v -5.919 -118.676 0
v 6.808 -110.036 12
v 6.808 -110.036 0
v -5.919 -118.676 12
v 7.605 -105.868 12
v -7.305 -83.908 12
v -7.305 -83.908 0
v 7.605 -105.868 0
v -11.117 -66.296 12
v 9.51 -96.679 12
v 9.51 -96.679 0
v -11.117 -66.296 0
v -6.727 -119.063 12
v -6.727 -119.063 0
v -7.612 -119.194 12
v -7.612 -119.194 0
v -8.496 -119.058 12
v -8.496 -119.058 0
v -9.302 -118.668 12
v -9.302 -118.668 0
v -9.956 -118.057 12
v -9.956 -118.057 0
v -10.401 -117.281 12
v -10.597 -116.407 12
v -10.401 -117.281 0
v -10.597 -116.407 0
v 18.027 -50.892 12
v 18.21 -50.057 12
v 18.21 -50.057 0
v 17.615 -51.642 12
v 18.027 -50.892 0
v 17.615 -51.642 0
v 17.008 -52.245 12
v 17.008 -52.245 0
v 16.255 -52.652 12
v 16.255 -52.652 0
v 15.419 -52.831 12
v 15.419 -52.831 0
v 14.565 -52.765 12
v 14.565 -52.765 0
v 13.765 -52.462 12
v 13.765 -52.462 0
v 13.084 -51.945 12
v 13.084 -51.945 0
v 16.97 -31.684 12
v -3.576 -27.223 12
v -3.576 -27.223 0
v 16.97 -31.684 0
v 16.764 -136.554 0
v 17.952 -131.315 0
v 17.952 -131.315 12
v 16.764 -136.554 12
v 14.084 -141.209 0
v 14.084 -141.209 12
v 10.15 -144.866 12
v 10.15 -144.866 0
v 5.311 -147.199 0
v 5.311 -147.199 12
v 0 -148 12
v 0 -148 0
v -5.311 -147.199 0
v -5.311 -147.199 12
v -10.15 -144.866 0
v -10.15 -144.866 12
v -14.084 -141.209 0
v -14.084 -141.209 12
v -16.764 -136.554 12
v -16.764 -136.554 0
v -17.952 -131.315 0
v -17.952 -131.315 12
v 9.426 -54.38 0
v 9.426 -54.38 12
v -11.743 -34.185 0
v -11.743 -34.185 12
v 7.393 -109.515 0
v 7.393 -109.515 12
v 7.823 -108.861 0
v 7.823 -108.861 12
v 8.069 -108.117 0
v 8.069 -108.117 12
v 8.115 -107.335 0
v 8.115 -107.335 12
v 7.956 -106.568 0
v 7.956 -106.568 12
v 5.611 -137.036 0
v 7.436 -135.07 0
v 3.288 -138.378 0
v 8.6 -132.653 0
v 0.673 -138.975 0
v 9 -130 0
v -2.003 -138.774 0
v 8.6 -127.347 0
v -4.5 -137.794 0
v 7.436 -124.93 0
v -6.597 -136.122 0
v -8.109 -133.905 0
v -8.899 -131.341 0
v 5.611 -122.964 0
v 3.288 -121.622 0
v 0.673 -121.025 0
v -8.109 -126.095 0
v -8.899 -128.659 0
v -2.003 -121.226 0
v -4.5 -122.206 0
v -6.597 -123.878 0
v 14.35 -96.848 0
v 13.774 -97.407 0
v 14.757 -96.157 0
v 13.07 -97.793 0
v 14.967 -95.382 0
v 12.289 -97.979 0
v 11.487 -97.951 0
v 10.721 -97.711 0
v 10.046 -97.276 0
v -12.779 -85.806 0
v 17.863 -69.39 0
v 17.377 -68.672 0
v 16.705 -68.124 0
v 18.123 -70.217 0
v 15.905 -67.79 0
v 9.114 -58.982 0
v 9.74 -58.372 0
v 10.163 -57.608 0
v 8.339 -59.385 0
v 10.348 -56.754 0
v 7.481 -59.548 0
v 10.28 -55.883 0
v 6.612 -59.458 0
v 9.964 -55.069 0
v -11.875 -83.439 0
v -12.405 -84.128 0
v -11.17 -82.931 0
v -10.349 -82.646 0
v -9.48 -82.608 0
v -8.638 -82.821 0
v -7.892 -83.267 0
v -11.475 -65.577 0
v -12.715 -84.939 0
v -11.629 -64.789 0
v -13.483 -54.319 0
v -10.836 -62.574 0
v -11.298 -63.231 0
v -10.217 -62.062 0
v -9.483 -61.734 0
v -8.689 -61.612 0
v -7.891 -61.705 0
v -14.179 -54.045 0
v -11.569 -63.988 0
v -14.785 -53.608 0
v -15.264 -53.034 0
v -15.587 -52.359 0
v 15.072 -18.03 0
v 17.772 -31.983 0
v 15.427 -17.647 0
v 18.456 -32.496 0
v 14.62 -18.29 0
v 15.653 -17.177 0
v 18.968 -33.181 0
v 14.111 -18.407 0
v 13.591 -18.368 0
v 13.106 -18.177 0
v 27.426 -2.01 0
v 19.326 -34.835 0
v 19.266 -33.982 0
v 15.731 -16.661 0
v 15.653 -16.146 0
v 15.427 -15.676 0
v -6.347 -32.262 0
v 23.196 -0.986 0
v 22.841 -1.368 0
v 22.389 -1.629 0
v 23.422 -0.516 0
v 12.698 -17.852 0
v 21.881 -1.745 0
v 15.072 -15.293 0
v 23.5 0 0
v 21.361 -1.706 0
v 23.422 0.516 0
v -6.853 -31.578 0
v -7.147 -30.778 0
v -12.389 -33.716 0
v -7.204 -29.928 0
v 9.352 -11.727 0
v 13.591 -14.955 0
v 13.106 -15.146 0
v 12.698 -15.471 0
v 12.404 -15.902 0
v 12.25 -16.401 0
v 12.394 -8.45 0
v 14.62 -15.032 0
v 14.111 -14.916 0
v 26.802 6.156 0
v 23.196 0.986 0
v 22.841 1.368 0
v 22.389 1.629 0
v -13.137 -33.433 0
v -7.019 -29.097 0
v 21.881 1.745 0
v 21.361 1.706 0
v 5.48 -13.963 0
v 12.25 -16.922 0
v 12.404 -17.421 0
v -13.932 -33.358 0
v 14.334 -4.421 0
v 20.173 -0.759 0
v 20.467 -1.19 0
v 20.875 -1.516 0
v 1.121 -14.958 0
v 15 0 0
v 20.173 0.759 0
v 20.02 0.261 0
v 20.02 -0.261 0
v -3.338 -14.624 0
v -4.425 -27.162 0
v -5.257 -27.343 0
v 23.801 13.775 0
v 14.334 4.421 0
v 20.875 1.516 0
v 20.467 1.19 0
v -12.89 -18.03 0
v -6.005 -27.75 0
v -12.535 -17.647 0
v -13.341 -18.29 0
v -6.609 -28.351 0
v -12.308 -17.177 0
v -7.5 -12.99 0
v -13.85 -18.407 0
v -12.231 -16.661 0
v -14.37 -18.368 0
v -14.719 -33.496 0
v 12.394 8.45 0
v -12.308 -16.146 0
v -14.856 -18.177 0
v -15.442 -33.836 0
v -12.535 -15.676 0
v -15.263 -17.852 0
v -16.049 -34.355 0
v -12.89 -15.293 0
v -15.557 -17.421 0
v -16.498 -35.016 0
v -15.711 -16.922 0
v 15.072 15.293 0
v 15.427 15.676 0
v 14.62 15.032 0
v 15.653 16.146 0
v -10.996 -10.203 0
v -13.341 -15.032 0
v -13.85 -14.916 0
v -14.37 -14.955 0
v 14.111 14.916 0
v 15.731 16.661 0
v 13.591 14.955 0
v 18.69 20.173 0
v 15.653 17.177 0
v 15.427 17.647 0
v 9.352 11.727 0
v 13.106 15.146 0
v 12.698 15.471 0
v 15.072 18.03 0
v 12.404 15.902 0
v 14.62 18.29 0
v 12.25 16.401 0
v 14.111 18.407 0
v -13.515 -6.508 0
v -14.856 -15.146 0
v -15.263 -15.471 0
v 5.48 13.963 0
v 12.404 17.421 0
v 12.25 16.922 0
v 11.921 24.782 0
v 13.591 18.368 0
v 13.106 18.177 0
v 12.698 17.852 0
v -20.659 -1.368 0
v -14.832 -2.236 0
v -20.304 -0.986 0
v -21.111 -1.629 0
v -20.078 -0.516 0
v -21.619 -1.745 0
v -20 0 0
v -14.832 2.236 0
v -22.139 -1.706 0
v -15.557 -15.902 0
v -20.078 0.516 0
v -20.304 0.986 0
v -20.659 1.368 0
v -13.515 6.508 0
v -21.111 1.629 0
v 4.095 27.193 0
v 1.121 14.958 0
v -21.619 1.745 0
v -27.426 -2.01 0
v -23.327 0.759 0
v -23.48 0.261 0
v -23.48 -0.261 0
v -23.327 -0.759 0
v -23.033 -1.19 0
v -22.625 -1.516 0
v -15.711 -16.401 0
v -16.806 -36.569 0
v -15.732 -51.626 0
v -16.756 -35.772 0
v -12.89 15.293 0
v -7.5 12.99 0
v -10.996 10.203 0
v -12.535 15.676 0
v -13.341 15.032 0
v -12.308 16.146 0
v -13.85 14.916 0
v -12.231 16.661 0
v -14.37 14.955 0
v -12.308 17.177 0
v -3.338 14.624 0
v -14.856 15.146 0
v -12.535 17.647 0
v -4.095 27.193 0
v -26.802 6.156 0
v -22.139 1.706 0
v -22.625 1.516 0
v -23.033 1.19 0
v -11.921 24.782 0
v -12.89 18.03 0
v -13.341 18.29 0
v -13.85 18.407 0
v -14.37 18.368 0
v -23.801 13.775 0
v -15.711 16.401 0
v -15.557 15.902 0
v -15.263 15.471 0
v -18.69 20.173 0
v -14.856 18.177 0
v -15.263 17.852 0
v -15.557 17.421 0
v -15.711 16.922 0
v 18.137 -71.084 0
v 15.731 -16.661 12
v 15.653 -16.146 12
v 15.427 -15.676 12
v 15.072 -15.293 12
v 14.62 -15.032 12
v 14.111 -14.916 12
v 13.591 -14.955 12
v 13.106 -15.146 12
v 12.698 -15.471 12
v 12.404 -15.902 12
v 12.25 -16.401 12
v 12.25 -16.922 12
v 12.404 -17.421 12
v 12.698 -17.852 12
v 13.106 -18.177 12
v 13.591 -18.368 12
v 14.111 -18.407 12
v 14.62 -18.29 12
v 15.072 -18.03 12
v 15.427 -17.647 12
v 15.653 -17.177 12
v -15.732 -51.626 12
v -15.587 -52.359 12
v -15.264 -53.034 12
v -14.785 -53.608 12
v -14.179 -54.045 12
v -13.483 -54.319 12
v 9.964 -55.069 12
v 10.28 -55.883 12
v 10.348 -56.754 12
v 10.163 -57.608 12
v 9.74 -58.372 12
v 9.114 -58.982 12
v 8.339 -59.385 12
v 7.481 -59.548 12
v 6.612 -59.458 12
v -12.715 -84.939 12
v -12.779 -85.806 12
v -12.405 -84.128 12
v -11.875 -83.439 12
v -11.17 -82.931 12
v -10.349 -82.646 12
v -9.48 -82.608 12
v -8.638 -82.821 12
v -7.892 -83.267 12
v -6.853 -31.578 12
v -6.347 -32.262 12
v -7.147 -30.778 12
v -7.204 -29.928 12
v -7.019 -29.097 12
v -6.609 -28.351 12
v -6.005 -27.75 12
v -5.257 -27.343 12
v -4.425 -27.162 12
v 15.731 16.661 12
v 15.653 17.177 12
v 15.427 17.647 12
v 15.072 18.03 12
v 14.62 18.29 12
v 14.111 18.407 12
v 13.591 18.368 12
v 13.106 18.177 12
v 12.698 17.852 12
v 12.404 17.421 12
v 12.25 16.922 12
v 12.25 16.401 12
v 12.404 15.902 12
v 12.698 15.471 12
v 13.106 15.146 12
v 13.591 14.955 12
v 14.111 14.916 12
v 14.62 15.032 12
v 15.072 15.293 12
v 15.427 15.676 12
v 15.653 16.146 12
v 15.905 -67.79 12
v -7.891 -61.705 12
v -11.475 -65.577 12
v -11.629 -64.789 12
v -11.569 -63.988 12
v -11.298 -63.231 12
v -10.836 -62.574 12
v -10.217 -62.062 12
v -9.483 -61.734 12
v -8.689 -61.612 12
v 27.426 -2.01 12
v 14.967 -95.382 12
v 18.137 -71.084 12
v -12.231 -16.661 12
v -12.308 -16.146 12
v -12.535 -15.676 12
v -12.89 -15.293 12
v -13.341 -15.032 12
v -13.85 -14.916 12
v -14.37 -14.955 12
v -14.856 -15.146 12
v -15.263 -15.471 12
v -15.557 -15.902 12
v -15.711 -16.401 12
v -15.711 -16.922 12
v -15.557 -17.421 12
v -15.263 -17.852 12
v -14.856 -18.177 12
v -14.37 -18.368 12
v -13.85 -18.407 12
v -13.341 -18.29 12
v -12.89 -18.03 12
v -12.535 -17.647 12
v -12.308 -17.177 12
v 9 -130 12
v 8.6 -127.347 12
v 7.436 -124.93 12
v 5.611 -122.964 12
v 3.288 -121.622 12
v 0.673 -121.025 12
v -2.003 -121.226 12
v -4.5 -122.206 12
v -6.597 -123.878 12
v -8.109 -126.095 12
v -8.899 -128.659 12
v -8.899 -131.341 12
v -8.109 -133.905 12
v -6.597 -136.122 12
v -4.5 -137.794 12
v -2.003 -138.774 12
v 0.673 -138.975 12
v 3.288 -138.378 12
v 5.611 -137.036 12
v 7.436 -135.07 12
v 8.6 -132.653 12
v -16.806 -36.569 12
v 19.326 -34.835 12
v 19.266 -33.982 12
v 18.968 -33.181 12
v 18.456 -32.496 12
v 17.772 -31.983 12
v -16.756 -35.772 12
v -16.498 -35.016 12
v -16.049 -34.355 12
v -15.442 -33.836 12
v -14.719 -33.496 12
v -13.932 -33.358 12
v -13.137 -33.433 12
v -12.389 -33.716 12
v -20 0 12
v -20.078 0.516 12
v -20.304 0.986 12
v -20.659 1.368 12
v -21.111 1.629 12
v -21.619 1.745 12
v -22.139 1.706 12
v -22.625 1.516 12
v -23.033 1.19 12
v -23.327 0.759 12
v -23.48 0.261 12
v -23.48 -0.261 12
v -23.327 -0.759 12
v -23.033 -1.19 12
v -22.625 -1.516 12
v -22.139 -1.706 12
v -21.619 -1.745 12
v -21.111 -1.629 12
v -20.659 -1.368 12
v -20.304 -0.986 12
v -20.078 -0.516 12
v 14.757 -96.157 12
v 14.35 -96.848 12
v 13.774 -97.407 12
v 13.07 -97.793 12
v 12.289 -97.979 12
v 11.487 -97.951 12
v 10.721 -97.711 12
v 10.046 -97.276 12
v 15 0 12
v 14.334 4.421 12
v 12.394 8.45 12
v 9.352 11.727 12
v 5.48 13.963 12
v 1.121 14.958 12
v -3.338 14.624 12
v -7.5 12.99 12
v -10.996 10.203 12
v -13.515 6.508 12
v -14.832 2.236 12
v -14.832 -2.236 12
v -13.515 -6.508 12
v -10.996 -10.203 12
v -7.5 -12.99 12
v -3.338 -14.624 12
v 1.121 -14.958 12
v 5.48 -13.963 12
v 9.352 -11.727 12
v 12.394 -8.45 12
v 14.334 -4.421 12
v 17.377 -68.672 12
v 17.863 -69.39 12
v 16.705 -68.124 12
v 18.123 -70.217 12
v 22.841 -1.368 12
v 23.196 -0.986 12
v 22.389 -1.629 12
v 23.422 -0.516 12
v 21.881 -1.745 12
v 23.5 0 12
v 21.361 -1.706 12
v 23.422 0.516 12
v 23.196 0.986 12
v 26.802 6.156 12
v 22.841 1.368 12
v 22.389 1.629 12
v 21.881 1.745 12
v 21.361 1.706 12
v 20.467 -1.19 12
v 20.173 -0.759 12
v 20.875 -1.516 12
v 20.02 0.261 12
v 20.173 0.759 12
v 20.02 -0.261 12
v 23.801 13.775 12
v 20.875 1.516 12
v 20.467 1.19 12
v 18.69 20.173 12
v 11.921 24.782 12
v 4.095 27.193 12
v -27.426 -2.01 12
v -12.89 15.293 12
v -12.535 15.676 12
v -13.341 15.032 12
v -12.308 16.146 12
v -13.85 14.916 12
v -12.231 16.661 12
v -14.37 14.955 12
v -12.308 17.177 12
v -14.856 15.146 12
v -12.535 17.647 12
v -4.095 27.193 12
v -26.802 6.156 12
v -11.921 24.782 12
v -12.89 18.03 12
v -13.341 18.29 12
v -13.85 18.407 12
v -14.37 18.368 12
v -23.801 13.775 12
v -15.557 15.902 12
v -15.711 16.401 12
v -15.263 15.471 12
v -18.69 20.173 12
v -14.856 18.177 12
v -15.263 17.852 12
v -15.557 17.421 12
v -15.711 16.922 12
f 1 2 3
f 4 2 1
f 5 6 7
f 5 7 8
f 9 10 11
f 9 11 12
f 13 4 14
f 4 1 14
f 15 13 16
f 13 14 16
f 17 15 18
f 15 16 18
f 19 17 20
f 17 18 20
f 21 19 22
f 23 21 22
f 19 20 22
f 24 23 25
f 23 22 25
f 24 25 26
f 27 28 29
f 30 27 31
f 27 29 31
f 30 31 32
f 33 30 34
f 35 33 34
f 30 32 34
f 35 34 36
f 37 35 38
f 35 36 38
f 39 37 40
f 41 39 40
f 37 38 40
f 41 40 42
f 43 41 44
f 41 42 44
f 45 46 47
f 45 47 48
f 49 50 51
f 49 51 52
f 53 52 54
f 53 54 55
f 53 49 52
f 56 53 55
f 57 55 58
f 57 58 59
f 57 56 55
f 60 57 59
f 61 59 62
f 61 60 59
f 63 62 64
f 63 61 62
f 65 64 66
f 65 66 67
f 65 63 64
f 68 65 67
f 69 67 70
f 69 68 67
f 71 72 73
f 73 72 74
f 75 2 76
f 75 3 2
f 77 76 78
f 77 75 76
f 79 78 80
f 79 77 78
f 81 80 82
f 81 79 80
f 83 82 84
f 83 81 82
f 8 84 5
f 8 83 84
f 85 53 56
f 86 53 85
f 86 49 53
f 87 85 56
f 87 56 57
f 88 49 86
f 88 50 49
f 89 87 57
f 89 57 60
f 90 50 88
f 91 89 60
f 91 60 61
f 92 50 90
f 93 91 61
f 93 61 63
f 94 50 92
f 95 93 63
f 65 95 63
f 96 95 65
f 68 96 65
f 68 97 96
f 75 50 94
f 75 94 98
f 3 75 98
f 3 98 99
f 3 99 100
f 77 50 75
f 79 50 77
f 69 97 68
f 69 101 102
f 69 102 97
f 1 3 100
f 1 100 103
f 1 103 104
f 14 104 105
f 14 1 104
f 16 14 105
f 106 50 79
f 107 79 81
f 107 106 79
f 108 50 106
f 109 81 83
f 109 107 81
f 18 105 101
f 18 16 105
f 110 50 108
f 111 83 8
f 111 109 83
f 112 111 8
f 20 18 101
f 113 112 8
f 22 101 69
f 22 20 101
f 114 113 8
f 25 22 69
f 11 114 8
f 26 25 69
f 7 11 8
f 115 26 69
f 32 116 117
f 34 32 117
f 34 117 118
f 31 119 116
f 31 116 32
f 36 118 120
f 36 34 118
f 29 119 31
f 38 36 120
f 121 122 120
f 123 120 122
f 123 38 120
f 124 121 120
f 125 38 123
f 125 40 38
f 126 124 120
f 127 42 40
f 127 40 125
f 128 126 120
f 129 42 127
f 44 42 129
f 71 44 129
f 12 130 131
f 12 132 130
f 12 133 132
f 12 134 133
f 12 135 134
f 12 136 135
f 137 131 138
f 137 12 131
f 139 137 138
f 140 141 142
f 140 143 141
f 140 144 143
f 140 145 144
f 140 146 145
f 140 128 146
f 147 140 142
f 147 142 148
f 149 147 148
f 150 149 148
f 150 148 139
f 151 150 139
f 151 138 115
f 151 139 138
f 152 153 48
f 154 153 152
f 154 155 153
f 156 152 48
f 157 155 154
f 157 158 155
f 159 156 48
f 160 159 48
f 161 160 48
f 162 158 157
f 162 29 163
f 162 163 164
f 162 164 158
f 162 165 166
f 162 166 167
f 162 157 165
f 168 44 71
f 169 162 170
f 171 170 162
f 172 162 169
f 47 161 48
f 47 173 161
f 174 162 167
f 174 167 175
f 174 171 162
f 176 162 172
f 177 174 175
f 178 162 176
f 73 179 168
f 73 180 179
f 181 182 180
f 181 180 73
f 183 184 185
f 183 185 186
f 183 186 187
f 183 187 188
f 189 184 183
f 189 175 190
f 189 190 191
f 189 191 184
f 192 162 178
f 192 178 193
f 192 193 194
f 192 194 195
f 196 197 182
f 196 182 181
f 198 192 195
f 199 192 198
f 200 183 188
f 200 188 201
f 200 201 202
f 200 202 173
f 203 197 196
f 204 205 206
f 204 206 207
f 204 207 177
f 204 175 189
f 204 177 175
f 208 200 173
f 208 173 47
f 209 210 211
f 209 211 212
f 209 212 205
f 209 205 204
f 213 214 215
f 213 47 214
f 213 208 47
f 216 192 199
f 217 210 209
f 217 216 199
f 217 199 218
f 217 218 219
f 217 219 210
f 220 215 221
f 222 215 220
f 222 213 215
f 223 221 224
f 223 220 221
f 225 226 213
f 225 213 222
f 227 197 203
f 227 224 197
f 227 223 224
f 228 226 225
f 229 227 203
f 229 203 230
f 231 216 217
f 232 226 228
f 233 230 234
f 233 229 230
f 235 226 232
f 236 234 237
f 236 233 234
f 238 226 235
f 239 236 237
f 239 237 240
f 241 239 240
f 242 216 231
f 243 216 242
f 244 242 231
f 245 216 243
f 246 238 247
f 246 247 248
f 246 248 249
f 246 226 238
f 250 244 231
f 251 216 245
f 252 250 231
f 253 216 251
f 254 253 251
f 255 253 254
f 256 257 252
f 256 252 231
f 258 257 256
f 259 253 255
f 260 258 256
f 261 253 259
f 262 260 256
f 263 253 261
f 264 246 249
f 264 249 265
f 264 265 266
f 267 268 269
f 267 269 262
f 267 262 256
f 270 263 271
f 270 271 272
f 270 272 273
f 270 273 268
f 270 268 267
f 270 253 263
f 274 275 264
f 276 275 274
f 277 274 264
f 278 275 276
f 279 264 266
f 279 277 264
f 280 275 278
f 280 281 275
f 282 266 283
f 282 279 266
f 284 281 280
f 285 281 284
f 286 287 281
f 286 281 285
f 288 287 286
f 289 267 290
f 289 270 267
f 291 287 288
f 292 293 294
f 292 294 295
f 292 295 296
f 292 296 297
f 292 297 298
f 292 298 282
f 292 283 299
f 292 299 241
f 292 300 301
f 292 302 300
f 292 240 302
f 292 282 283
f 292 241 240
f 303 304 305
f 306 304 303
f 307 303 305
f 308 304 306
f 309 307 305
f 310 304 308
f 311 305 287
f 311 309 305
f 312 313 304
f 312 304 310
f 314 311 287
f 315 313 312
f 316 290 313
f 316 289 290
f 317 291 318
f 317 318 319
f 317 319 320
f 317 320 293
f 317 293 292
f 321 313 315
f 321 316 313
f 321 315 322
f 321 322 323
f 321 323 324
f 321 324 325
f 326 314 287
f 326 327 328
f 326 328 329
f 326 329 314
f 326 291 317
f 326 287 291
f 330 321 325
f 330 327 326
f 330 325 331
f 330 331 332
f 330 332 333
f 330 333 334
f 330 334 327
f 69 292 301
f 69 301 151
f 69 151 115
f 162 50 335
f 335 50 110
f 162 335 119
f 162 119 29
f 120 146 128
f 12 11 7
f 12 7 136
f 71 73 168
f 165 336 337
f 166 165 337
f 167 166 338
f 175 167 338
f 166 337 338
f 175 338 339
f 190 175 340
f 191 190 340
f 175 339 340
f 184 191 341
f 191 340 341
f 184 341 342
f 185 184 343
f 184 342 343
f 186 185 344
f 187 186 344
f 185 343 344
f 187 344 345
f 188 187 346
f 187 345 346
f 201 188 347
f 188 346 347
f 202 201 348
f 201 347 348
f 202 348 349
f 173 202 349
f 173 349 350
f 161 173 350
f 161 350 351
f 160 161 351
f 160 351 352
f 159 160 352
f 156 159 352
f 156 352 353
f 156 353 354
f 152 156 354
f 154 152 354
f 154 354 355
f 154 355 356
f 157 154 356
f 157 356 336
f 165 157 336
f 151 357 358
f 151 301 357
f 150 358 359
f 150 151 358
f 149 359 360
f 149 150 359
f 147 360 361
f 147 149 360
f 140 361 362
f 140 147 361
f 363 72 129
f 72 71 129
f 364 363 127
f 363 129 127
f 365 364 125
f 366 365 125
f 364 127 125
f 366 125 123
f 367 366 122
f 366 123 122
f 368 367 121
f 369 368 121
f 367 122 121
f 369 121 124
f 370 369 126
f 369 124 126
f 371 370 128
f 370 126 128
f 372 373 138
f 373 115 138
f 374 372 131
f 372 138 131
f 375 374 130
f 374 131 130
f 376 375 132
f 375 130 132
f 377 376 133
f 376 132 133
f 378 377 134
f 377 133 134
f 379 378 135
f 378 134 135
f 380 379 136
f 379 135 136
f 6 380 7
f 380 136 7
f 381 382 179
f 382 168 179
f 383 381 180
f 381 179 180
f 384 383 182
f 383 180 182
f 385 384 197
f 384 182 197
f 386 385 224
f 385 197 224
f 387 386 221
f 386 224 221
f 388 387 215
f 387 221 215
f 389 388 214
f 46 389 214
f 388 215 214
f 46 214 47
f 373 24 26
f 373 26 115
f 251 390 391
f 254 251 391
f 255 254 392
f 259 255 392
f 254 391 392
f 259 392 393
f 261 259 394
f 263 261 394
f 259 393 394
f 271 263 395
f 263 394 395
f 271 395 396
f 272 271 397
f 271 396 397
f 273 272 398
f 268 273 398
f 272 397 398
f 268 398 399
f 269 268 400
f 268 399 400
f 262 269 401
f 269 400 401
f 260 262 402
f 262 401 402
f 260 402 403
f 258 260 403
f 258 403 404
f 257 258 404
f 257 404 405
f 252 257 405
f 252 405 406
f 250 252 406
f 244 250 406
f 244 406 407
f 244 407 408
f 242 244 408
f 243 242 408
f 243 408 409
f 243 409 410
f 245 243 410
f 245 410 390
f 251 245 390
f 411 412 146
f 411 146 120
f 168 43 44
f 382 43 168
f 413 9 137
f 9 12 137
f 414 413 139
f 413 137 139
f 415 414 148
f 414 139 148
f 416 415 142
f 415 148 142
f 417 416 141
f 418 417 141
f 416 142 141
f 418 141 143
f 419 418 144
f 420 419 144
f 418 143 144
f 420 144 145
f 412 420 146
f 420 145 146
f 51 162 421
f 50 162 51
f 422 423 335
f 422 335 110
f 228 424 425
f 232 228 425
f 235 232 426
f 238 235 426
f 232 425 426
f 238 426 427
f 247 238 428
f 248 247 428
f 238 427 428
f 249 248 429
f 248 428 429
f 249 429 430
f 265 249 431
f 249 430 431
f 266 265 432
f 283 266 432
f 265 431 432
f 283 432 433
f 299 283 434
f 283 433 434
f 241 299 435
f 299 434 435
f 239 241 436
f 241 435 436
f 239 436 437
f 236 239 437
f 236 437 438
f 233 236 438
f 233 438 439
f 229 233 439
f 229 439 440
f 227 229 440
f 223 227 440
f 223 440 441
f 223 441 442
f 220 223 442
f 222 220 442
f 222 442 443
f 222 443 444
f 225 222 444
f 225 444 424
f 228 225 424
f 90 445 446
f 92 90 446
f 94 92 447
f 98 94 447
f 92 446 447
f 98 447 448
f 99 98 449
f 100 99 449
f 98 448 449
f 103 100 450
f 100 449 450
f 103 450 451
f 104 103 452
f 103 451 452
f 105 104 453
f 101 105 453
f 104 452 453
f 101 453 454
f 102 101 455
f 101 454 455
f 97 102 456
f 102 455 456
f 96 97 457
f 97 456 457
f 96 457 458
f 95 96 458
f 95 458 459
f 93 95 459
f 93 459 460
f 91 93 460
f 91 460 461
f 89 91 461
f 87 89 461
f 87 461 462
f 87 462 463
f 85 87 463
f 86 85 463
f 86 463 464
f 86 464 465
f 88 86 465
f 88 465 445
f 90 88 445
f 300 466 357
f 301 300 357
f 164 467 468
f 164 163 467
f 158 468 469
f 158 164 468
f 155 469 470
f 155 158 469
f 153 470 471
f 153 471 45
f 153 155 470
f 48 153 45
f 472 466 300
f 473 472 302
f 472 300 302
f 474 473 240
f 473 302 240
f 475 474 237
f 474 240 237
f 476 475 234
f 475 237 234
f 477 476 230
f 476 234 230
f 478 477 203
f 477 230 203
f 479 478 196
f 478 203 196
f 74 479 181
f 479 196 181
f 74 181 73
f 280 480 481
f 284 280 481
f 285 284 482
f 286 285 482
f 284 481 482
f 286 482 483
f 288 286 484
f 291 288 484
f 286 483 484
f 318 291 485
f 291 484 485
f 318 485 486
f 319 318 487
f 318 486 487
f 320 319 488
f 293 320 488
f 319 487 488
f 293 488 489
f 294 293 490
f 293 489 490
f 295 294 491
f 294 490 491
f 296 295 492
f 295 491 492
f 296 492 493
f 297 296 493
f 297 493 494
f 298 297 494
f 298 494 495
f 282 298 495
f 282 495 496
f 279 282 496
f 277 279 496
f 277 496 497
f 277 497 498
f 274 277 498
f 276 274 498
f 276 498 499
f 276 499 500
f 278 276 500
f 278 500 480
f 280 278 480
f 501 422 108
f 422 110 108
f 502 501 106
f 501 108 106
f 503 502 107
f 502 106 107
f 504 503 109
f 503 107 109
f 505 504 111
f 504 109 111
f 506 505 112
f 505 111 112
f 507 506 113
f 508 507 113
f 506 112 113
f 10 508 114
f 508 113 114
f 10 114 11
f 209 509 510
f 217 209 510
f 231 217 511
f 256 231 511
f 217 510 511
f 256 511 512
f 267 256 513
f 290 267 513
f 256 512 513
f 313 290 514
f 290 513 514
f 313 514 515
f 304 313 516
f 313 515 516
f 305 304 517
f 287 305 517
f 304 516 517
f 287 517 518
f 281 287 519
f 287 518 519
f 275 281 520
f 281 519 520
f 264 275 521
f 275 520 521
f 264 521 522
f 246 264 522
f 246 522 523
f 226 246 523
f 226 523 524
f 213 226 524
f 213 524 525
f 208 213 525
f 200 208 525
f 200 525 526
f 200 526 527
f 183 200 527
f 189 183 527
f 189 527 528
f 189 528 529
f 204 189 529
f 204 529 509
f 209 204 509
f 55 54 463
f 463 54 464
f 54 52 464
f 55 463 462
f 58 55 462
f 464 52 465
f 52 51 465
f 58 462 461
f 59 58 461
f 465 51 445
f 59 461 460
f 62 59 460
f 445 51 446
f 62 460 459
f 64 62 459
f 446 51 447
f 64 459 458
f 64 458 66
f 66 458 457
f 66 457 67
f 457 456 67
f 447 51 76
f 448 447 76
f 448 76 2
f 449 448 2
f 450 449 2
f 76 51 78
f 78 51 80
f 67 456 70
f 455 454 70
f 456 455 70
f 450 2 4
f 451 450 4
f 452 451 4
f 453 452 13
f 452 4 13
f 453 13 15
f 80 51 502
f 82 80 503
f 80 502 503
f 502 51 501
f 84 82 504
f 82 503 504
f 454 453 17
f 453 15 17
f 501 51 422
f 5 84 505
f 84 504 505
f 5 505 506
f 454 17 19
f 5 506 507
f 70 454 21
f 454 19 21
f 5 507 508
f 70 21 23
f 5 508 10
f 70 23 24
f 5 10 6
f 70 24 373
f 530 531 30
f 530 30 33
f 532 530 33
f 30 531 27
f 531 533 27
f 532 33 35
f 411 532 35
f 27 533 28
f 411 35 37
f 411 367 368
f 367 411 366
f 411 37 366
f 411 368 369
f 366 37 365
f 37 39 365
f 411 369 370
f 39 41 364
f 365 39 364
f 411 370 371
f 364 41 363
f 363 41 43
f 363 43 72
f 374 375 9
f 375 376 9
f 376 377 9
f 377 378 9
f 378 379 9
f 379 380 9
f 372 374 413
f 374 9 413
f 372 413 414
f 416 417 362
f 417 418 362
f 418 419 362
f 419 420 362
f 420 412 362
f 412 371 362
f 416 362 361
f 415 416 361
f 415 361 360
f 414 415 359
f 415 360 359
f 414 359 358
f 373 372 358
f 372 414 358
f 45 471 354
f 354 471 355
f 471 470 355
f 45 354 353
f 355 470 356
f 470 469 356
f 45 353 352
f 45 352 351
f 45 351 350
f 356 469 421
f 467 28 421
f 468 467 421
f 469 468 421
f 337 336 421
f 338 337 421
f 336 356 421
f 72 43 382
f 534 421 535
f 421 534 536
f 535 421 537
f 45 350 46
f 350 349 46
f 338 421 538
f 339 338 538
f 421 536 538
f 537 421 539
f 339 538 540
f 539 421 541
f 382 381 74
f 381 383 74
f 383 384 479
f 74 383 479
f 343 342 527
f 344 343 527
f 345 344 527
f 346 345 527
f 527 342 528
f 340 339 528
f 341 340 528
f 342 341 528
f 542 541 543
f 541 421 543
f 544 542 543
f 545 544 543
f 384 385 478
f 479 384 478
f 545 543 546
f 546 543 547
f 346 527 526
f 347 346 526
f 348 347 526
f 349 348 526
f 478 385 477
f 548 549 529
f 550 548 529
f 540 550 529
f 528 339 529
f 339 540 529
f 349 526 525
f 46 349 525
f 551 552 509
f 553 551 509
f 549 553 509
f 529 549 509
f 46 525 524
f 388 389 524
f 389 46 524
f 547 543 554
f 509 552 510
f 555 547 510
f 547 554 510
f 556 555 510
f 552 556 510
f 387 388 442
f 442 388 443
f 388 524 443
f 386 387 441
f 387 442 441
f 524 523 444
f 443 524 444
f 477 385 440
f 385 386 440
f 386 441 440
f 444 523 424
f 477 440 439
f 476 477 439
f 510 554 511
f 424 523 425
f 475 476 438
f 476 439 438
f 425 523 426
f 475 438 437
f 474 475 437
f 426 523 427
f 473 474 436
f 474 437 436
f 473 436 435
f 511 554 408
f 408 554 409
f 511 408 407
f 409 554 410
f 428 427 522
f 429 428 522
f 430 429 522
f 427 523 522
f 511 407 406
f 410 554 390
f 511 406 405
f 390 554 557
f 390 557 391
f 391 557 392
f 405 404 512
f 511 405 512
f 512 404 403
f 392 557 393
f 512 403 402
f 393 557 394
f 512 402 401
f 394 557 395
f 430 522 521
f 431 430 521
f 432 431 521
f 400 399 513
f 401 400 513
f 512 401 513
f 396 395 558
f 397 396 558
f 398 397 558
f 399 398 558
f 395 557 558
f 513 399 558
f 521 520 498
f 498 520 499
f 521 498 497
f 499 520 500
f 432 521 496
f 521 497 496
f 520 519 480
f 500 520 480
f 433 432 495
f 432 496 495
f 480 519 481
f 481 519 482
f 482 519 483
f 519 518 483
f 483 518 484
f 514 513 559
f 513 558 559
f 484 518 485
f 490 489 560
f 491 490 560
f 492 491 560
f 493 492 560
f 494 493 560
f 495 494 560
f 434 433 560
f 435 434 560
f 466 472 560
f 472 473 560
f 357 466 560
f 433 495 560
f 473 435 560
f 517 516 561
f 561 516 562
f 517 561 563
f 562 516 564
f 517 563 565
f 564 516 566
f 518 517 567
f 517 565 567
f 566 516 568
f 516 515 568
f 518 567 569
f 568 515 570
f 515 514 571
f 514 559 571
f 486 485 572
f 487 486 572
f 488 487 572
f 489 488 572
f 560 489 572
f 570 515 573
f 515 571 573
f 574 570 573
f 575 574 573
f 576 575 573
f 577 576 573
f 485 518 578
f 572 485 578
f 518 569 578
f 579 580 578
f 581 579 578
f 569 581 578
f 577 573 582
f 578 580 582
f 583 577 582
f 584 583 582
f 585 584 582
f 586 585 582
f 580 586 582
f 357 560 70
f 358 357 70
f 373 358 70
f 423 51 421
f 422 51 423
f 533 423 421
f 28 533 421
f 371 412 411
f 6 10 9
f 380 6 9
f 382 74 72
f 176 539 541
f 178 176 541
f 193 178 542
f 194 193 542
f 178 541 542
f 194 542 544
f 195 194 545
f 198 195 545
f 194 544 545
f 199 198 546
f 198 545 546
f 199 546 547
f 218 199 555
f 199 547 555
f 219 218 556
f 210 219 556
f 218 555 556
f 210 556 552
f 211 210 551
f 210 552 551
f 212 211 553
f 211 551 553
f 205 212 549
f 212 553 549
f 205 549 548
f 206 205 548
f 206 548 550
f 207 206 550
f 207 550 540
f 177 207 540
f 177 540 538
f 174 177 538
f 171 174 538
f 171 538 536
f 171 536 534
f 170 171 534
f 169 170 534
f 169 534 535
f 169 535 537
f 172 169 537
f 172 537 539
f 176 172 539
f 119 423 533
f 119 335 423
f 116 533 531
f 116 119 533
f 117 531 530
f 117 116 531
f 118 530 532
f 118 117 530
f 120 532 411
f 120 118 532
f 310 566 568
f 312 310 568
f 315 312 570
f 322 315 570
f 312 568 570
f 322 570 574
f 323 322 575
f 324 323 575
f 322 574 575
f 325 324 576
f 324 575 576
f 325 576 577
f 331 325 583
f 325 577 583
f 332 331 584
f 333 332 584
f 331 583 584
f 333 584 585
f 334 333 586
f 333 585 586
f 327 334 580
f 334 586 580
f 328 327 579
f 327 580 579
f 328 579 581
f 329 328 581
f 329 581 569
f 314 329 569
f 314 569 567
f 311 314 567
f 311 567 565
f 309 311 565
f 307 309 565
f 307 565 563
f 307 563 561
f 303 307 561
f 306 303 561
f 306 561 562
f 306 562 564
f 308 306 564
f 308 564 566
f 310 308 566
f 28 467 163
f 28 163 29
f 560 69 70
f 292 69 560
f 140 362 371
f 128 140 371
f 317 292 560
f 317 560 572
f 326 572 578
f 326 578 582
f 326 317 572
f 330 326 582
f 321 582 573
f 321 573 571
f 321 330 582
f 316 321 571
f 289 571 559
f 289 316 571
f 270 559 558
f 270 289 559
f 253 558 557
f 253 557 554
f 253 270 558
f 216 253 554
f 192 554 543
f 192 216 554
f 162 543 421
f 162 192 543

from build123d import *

# Parameters (mm, degrees)
EXTRUDE_1_DEPTH     = 12
SKETCH_2_R          = 1.75
CUT_EXTRUDE_1_DEPTH = 15
SKETCH_3_R          = 15
CUT_EXTRUDE_2_DEPTH = 152.010761206
SKETCH_4_R          = 9
CUT_EXTRUDE_3_DEPTH = 152.010761206
CUT_EXTRUDE_4_DEPTH = 46
FILLET_1_R          = 3


with BuildPart() as part:
    # 草图1 → 凸台-拉伸1 (new body)
    with BuildSketch(Plane.XY):
        with BuildLine():
            Line((-17.951873532, -131.315384615), (-27.426473452, -2.009615385))
            ThreePointArc((-27.426473452, -2.009615385), (0, 27.5), (27.426473452, -2.009615385))
            Line((27.426473452, -2.009615385), (17.951873532, -131.315384615))
            ThreePointArc((17.951873532, -131.315384615), (0, -148), (-17.951873532, -131.315384615))
        make_face()
    extrude(amount=EXTRUDE_1_DEPTH)

    # 草图2 → 切除-拉伸1 (cut)
    with BuildSketch(Plane.XY.offset(12)):
        with Locations((-13.980630511, 16.661466638)):
            Circle(SKETCH_2_R)
        with Locations((-21.75, 0)):
            Circle(SKETCH_2_R)
        with Locations((-13.980630511, -16.661466638)):
            Circle(SKETCH_2_R)
        with Locations((13.980630511, -16.661466638)):
            Circle(SKETCH_2_R)
        with Locations((21.75, 0)):
            Circle(SKETCH_2_R)
        with Locations((13.980630511, 16.661466638)):
            Circle(SKETCH_2_R)
    extrude(amount=-CUT_EXTRUDE_1_DEPTH, mode=Mode.SUBTRACT)

    # 草图3 → 切除-拉伸2 (cut, through all)
    with BuildSketch(Plane.XY.offset(12)):
        Circle(SKETCH_3_R)
    extrude(amount=-CUT_EXTRUDE_2_DEPTH, mode=Mode.SUBTRACT)

    # 草图4 → 切除-拉伸3 (cut, through all)
    with BuildSketch(Plane.XY.offset(12)):
        with Locations((0, -130)):
            Circle(SKETCH_4_R)
    extrude(amount=-CUT_EXTRUDE_3_DEPTH, mode=Mode.SUBTRACT)

    # 草图5 → 切除-拉伸4 (cut)
    with BuildSketch(Plane.XY.offset(12)):
        Polygon((-13.435471405, -25.082066527), (19.516134608, -32.237272404), (17.727418447, -56.648996486), align=None)
        Polygon((-17.358092238, -28.828340185), (-15.578532958, -53.783302593), (17.727418447, -62.299703149), align=None)
        Polygon((-15.56602545, -59.74235485), (18.480575735, -68.448141084), (13.945389013, -103.211738941), align=None)
        Polygon((-13.572905823, -74.67479367), (9.289595148, -108.350537584), (-10.226621526, -121.600119355), align=None)
    extrude(amount=-CUT_EXTRUDE_4_DEPTH, mode=Mode.SUBTRACT)

    # 圆角1
    fillet_1_edges = [part.edges().sort_by_distance(p)[0] for p in [
        (13.945389013, -103.211738941, 6),
        (-15.56602545, -59.74235485, 6),
        (18.480575735, -68.448141084, 6),
        (-17.358092238, -28.828340185, 6),
        (17.727418447, -62.299703149, 6),
        (-15.578532958, -53.783302593, 6),
        (9.289595148, -108.350537584, 6),
        (-10.226621526, -121.600119355, 6),
        (-13.572905823, -74.67479367, 6),
        (17.727418447, -56.648996486, 6),
        (-13.435471405, -25.082066527, 6),
        (19.516134608, -32.237272404, 6),
    ]]
    fillet(fillet_1_edges, radius=FILLET_1_R)


solid = part.part
